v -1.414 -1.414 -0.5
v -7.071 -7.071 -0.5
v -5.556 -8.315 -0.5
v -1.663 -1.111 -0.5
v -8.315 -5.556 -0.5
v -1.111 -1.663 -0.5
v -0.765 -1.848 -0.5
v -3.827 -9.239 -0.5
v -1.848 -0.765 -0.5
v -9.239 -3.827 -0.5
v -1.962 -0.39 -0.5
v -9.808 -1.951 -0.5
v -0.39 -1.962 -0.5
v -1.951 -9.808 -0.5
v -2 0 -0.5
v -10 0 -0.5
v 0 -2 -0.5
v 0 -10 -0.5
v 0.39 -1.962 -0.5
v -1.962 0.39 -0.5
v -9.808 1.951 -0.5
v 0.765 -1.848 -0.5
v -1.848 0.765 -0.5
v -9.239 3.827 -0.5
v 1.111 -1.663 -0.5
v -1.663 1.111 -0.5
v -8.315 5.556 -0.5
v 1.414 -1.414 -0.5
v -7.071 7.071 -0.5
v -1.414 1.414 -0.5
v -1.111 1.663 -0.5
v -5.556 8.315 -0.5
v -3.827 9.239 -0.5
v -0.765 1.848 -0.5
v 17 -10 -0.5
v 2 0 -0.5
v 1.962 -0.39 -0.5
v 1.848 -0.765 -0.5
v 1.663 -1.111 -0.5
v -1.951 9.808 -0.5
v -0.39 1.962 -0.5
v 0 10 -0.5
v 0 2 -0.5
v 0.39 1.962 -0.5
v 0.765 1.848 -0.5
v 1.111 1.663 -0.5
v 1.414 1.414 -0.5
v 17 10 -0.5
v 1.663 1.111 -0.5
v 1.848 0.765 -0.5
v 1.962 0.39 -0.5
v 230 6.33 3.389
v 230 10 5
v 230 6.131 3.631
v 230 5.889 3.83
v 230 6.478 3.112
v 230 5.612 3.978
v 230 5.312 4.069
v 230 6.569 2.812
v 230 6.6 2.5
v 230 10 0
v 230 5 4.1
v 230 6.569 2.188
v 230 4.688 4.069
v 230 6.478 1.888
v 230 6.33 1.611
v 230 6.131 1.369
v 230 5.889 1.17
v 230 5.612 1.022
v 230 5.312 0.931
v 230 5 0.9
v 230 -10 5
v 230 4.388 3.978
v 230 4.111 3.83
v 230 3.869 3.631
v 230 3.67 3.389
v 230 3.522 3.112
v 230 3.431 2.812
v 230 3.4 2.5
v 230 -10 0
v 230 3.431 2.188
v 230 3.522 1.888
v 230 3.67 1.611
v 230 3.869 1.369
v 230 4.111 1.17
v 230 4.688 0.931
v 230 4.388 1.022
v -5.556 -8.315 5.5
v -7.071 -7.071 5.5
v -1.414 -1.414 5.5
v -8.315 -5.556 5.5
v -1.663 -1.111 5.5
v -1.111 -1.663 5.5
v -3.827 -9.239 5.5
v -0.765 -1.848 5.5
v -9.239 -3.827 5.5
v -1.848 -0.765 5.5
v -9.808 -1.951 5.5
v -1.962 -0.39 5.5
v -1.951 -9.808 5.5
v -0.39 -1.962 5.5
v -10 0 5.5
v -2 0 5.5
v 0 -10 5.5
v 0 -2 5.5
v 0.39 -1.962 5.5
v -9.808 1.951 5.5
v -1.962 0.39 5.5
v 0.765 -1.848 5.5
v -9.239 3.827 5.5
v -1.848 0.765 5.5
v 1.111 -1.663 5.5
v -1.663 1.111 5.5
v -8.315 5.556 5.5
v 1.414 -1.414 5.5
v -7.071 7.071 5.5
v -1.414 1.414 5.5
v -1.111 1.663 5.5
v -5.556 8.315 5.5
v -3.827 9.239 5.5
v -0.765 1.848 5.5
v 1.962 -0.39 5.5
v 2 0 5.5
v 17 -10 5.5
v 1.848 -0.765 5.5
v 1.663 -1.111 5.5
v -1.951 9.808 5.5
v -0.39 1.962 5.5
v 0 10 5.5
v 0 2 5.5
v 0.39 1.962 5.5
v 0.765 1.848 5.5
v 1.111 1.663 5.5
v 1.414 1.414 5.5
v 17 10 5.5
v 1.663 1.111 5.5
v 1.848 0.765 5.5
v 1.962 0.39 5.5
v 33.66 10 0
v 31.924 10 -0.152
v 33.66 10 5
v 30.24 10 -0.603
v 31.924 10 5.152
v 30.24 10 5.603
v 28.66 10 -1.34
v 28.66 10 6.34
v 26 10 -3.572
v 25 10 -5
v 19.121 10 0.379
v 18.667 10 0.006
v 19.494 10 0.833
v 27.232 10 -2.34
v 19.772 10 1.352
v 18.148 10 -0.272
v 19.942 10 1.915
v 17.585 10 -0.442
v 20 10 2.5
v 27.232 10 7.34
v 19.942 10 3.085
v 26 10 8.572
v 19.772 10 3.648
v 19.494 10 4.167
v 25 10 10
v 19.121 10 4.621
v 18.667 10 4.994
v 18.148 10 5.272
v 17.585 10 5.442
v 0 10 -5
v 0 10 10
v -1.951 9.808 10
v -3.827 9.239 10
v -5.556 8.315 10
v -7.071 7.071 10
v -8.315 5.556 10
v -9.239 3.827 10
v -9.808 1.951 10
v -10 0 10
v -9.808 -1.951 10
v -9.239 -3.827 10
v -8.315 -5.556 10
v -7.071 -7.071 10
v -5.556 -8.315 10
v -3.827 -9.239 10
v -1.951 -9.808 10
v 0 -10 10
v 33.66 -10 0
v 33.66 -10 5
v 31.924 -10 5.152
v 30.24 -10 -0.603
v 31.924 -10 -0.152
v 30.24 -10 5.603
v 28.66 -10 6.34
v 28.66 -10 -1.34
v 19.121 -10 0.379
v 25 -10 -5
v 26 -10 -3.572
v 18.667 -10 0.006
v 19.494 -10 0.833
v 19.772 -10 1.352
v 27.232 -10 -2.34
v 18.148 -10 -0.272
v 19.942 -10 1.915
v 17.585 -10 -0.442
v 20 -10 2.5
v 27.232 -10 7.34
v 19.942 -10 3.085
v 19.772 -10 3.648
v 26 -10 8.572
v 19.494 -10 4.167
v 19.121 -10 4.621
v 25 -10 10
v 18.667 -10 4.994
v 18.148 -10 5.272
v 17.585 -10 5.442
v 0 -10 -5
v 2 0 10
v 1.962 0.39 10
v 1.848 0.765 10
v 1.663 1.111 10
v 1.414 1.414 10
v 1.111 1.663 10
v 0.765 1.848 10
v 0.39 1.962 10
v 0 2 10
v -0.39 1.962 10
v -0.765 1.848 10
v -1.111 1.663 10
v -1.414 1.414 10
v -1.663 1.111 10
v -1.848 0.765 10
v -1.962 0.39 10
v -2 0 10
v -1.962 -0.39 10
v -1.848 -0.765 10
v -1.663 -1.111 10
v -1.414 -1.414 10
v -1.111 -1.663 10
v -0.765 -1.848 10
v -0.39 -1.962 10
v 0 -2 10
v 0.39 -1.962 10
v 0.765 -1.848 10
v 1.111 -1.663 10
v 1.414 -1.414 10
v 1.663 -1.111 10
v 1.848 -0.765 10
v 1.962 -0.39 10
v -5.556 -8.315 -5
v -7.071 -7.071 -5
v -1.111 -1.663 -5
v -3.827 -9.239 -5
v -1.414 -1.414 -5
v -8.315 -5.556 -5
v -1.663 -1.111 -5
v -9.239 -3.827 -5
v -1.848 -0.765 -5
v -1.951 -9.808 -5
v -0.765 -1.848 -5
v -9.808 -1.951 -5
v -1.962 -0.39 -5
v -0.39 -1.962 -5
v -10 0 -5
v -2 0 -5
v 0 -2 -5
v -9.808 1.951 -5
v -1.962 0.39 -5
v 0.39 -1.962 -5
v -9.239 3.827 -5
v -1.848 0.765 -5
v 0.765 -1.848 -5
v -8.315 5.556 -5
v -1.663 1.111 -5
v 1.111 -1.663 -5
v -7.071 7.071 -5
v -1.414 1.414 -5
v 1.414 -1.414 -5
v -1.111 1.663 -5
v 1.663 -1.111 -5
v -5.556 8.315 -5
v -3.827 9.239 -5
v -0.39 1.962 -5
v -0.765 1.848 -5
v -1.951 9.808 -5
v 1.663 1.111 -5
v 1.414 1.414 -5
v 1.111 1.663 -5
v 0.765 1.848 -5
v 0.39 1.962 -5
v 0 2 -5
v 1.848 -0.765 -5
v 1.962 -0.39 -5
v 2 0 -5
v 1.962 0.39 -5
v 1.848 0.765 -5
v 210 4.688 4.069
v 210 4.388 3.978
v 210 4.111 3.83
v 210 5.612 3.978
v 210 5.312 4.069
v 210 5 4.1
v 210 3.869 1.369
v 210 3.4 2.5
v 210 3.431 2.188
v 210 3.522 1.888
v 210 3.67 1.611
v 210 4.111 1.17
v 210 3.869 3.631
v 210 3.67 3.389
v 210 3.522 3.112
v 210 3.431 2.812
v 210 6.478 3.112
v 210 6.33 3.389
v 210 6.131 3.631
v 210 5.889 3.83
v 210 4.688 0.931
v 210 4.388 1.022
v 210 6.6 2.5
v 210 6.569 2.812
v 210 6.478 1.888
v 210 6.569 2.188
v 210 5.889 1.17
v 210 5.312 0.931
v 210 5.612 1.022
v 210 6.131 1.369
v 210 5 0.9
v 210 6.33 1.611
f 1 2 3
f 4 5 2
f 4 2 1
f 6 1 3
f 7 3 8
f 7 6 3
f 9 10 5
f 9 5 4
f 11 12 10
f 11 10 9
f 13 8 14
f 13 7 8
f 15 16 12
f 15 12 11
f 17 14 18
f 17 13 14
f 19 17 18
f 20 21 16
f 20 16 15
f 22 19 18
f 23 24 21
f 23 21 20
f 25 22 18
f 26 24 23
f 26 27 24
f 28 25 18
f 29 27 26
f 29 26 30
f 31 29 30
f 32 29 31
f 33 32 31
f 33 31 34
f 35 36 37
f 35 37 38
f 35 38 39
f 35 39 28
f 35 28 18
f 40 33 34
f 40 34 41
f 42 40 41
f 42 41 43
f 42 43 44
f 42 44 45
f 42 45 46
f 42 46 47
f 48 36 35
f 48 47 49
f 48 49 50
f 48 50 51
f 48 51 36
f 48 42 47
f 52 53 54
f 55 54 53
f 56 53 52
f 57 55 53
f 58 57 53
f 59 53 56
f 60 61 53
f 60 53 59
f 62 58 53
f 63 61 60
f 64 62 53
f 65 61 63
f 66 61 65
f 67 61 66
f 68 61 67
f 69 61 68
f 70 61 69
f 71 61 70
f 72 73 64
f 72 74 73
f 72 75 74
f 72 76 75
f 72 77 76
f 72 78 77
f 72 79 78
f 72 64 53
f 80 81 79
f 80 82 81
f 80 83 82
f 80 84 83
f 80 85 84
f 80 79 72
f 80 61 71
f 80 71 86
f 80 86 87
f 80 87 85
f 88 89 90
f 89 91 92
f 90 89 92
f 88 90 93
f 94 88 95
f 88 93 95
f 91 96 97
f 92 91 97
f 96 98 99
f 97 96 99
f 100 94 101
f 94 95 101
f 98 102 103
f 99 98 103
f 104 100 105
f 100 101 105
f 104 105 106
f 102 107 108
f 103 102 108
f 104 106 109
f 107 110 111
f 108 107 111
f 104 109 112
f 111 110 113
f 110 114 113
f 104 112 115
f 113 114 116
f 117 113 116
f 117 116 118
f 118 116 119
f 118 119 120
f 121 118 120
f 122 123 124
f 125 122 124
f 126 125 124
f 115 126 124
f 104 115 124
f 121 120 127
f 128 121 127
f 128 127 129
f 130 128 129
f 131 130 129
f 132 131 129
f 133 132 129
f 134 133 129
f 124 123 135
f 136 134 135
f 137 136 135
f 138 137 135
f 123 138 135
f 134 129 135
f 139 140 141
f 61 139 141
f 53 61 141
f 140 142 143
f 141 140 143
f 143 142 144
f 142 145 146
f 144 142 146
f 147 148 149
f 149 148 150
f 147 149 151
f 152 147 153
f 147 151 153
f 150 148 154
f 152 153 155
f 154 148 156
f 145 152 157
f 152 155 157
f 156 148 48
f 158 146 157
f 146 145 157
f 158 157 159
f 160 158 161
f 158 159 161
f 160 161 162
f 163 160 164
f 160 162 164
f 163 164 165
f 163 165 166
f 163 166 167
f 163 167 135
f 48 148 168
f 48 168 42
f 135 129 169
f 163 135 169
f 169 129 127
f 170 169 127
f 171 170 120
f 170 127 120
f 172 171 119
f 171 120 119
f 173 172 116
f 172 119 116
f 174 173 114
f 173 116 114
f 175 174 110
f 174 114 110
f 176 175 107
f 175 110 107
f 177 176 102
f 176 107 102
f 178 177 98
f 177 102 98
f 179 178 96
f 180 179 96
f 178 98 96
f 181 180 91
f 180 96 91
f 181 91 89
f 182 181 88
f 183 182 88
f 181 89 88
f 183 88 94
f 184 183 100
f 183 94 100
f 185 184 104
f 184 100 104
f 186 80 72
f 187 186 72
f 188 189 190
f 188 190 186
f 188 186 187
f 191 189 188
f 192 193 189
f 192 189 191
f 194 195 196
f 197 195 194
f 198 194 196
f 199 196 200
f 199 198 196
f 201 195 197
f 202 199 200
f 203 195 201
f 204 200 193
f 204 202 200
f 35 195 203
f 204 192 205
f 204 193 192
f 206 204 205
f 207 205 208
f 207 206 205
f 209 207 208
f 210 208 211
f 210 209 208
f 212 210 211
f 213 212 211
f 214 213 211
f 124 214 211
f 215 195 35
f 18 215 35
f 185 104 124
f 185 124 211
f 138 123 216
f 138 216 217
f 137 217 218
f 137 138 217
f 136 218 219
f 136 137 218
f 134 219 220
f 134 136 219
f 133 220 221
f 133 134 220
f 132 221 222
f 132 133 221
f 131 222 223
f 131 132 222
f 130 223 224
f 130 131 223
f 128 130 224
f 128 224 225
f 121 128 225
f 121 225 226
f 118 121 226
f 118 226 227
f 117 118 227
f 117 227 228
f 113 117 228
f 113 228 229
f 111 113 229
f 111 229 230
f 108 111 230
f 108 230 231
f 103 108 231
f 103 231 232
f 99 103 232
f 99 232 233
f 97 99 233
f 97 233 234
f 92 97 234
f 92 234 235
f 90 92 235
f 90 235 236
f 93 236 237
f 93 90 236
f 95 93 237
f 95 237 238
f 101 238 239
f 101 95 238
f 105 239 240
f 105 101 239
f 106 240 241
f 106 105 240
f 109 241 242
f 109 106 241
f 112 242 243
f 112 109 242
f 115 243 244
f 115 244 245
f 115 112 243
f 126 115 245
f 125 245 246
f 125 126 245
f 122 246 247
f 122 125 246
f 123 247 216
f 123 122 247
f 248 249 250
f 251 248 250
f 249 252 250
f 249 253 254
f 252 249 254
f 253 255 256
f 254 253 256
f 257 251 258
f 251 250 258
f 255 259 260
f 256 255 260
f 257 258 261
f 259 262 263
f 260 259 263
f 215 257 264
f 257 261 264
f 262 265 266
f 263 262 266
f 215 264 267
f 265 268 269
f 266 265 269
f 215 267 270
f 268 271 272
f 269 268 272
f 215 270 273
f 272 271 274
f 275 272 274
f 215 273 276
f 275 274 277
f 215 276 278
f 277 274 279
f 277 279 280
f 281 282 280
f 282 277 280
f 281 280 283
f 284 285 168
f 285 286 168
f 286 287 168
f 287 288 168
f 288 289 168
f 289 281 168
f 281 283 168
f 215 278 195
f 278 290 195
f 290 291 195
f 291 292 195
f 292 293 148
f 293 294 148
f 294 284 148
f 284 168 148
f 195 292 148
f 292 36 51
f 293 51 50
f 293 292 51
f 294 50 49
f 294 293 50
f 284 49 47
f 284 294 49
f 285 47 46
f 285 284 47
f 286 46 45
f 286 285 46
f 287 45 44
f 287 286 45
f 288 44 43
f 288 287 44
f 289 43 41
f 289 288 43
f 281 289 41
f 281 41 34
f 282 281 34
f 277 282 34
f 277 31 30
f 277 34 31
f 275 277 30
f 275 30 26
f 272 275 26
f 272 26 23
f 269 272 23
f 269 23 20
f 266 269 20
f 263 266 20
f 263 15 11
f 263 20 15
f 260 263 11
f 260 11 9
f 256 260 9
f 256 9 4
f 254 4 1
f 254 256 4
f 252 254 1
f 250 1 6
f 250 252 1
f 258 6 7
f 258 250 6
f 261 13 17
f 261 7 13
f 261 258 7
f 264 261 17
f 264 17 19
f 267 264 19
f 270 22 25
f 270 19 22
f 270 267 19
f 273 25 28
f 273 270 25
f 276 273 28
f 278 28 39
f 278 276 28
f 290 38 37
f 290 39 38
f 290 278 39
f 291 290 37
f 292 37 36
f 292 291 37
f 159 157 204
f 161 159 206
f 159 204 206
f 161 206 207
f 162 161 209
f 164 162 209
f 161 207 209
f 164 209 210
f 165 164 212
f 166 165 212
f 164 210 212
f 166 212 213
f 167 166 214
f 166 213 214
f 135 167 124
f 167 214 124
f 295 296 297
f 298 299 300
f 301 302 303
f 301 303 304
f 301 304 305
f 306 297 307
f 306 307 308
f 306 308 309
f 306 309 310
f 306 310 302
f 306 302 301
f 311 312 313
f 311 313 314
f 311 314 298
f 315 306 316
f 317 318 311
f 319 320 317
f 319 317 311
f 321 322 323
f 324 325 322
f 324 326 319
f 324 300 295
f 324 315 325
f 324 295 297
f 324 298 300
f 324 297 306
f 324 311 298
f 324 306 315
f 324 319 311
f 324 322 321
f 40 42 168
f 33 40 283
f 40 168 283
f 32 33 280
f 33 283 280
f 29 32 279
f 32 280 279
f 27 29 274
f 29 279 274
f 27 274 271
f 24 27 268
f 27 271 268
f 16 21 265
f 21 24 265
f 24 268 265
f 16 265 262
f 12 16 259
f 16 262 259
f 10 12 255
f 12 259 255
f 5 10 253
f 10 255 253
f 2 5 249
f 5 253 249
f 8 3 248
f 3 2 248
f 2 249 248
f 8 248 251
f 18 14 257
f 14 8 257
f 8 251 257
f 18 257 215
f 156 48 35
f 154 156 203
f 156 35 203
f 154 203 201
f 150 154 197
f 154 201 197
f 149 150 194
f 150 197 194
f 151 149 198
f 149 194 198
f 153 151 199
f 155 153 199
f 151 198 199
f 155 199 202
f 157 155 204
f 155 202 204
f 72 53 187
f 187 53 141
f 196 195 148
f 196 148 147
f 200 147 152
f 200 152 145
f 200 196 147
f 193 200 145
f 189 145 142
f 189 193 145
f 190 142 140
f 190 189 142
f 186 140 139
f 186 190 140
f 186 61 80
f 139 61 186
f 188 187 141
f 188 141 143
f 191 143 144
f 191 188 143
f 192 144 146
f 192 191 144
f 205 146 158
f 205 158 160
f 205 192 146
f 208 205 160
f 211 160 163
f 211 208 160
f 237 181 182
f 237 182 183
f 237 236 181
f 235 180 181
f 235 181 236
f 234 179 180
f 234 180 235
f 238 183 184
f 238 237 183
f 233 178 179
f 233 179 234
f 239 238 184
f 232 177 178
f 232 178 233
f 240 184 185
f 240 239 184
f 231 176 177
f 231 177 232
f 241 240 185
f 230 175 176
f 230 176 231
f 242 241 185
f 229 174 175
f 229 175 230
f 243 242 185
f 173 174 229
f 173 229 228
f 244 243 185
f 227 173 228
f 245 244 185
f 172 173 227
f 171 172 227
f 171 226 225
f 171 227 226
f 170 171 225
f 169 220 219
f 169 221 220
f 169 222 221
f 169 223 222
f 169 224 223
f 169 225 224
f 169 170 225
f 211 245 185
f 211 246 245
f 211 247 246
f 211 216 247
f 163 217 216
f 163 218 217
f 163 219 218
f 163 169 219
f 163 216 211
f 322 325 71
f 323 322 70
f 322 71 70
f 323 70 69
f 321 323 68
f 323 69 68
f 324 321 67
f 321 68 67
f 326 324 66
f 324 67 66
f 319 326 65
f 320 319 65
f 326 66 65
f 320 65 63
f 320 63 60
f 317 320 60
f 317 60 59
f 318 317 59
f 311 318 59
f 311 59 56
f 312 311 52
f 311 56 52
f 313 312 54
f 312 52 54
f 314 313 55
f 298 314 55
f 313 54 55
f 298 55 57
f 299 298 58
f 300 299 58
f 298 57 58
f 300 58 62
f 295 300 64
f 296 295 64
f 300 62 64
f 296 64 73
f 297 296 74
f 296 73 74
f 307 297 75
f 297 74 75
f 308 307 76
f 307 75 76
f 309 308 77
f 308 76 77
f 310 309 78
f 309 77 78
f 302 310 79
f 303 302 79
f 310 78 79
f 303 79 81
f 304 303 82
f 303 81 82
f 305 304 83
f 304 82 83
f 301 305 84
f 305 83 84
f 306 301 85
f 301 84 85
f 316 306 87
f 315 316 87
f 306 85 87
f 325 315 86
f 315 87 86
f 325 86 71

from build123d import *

# Parameters (mm, degrees)
SKETCH1_R                = 2
BOSS_EXTRUDE1_DEPTH      = 5
BOSS_EXTRUDE2_DEPTH      = 5
BOSS_EXTRUDE2_DEPTH_BACK = 10
SKETCH2_R                = 2
SKETCH4_W                = 40
SKETCH4_H                = 6
CUT_EXTRUDE1_DEPTH       = 232.084400166
FILLET1_R                = 10
FILLET2_R                = 3
SKETCH5_R                = 1.6
CUT_EXTRUDE2_DEPTH       = 20


# Some blends are built 0.0001 mm under size
with BuildPart() as part:
    # Sketch1 → Boss-Extrude1 (new body)
    with BuildSketch(Plane.XY):
        with BuildLine():
            Line((0, 10), (230, 10))
            Line((230, 10), (230, -10))
            Line((230, -10), (0, -10))
            ThreePointArc((0, -10), (-10, 0), (0, 10))
        make_face()
        Circle(SKETCH1_R, mode=Mode.SUBTRACT)
    extrude(amount=BOSS_EXTRUDE1_DEPTH)

    # Sketch2 → Boss-Extrude2 (add, two sides: drawn at the far end of the back side and taken through both)
    with BuildSketch(Plane.XY.offset(5).offset(-BOSS_EXTRUDE2_DEPTH_BACK)):
        with BuildLine():
            Line((25, -10), (25, 10))
            Line((25, 10), (0, 10))
            ThreePointArc((0, 10), (-10, 0), (0, -10))
            Line((0, -10), (25, -10))
        make_face()
        Circle(SKETCH2_R, mode=Mode.SUBTRACT)
    extrude(amount=BOSS_EXTRUDE2_DEPTH + BOSS_EXTRUDE2_DEPTH_BACK)

    # Sketch4 → Cut-Extrude1 (cut, through all)
    with BuildSketch(Plane(origin=(0, 10, 0), x_dir=(1, 0, 0), z_dir=(0, 1, 0))):
        with Locations((0, -2.5)):
            Rectangle(SKETCH4_W, SKETCH4_H)
    extrude(amount=-CUT_EXTRUDE1_DEPTH, mode=Mode.SUBTRACT)

    # Fillet1
    # the kernel refuses this fillet: 10 mm, written as the material it adds along each edge
    with BuildSketch(Plane(origin=(25, -10, 5), x_dir=(1, 0, 0), z_dir=(0, 1, 0))) as fillet1_piece_1:
        with BuildLine():
            CenterArc((8.660254038, -10), FILLET1_R, 90, 60)
            Line((0, -5), (-0.173205081, -4.9))
            ThreePointArc((-0.173205081, -4.9), (-0.2, -2.5), (-0.2, 0))
            Line((-0.2, 0), (0, 0.2))
            Line((0, 0.2), (8.660254038, 0.2))
            Line((8.660254038, 0.2), (8.660254038, 0))
        make_face()
    extrude(amount=20)
    with BuildSketch(Plane(origin=(25, -10, 0), x_dir=(0, 0, -1), z_dir=(0, 1, 0))) as fillet1_piece_2:
        with BuildLine():
            CenterArc((10, -8.660254038), FILLET1_R, 120, 60)
            Line((0, -8.660254038), (-0.2, -8.660254038))
            Line((-0.2, -8.660254038), (-0.2, 0))
            Line((-0.2, 0), (0, 0.2))
            ThreePointArc((0, 0.2), (2.5, 0.2), (4.9, 0.173205081))
            Line((4.9, 0.173205081), (5, 0))
        make_face()
    extrude(amount=20)

    # Fillet2
    fillet2_edges = [part.edges().sort_by_distance(p)[0] for p in [
        (20, 0, -0.5),
        (20, 0, 5.5),
    ]]
    fillet(fillet2_edges, radius=FILLET2_R - 0.0001)  # a hair under: the kernel refuses the full size

    # Sketch5 → Cut-Extrude2 (cut)
    with BuildSketch(Plane(origin=(230, 0, 0), x_dir=(0, 0, -1), z_dir=(1, 0, 0))):
        with Locations((-2.5, 5)):
            Circle(SKETCH5_R)
    extrude(amount=-CUT_EXTRUDE2_DEPTH, mode=Mode.SUBTRACT)


solid = part.part
